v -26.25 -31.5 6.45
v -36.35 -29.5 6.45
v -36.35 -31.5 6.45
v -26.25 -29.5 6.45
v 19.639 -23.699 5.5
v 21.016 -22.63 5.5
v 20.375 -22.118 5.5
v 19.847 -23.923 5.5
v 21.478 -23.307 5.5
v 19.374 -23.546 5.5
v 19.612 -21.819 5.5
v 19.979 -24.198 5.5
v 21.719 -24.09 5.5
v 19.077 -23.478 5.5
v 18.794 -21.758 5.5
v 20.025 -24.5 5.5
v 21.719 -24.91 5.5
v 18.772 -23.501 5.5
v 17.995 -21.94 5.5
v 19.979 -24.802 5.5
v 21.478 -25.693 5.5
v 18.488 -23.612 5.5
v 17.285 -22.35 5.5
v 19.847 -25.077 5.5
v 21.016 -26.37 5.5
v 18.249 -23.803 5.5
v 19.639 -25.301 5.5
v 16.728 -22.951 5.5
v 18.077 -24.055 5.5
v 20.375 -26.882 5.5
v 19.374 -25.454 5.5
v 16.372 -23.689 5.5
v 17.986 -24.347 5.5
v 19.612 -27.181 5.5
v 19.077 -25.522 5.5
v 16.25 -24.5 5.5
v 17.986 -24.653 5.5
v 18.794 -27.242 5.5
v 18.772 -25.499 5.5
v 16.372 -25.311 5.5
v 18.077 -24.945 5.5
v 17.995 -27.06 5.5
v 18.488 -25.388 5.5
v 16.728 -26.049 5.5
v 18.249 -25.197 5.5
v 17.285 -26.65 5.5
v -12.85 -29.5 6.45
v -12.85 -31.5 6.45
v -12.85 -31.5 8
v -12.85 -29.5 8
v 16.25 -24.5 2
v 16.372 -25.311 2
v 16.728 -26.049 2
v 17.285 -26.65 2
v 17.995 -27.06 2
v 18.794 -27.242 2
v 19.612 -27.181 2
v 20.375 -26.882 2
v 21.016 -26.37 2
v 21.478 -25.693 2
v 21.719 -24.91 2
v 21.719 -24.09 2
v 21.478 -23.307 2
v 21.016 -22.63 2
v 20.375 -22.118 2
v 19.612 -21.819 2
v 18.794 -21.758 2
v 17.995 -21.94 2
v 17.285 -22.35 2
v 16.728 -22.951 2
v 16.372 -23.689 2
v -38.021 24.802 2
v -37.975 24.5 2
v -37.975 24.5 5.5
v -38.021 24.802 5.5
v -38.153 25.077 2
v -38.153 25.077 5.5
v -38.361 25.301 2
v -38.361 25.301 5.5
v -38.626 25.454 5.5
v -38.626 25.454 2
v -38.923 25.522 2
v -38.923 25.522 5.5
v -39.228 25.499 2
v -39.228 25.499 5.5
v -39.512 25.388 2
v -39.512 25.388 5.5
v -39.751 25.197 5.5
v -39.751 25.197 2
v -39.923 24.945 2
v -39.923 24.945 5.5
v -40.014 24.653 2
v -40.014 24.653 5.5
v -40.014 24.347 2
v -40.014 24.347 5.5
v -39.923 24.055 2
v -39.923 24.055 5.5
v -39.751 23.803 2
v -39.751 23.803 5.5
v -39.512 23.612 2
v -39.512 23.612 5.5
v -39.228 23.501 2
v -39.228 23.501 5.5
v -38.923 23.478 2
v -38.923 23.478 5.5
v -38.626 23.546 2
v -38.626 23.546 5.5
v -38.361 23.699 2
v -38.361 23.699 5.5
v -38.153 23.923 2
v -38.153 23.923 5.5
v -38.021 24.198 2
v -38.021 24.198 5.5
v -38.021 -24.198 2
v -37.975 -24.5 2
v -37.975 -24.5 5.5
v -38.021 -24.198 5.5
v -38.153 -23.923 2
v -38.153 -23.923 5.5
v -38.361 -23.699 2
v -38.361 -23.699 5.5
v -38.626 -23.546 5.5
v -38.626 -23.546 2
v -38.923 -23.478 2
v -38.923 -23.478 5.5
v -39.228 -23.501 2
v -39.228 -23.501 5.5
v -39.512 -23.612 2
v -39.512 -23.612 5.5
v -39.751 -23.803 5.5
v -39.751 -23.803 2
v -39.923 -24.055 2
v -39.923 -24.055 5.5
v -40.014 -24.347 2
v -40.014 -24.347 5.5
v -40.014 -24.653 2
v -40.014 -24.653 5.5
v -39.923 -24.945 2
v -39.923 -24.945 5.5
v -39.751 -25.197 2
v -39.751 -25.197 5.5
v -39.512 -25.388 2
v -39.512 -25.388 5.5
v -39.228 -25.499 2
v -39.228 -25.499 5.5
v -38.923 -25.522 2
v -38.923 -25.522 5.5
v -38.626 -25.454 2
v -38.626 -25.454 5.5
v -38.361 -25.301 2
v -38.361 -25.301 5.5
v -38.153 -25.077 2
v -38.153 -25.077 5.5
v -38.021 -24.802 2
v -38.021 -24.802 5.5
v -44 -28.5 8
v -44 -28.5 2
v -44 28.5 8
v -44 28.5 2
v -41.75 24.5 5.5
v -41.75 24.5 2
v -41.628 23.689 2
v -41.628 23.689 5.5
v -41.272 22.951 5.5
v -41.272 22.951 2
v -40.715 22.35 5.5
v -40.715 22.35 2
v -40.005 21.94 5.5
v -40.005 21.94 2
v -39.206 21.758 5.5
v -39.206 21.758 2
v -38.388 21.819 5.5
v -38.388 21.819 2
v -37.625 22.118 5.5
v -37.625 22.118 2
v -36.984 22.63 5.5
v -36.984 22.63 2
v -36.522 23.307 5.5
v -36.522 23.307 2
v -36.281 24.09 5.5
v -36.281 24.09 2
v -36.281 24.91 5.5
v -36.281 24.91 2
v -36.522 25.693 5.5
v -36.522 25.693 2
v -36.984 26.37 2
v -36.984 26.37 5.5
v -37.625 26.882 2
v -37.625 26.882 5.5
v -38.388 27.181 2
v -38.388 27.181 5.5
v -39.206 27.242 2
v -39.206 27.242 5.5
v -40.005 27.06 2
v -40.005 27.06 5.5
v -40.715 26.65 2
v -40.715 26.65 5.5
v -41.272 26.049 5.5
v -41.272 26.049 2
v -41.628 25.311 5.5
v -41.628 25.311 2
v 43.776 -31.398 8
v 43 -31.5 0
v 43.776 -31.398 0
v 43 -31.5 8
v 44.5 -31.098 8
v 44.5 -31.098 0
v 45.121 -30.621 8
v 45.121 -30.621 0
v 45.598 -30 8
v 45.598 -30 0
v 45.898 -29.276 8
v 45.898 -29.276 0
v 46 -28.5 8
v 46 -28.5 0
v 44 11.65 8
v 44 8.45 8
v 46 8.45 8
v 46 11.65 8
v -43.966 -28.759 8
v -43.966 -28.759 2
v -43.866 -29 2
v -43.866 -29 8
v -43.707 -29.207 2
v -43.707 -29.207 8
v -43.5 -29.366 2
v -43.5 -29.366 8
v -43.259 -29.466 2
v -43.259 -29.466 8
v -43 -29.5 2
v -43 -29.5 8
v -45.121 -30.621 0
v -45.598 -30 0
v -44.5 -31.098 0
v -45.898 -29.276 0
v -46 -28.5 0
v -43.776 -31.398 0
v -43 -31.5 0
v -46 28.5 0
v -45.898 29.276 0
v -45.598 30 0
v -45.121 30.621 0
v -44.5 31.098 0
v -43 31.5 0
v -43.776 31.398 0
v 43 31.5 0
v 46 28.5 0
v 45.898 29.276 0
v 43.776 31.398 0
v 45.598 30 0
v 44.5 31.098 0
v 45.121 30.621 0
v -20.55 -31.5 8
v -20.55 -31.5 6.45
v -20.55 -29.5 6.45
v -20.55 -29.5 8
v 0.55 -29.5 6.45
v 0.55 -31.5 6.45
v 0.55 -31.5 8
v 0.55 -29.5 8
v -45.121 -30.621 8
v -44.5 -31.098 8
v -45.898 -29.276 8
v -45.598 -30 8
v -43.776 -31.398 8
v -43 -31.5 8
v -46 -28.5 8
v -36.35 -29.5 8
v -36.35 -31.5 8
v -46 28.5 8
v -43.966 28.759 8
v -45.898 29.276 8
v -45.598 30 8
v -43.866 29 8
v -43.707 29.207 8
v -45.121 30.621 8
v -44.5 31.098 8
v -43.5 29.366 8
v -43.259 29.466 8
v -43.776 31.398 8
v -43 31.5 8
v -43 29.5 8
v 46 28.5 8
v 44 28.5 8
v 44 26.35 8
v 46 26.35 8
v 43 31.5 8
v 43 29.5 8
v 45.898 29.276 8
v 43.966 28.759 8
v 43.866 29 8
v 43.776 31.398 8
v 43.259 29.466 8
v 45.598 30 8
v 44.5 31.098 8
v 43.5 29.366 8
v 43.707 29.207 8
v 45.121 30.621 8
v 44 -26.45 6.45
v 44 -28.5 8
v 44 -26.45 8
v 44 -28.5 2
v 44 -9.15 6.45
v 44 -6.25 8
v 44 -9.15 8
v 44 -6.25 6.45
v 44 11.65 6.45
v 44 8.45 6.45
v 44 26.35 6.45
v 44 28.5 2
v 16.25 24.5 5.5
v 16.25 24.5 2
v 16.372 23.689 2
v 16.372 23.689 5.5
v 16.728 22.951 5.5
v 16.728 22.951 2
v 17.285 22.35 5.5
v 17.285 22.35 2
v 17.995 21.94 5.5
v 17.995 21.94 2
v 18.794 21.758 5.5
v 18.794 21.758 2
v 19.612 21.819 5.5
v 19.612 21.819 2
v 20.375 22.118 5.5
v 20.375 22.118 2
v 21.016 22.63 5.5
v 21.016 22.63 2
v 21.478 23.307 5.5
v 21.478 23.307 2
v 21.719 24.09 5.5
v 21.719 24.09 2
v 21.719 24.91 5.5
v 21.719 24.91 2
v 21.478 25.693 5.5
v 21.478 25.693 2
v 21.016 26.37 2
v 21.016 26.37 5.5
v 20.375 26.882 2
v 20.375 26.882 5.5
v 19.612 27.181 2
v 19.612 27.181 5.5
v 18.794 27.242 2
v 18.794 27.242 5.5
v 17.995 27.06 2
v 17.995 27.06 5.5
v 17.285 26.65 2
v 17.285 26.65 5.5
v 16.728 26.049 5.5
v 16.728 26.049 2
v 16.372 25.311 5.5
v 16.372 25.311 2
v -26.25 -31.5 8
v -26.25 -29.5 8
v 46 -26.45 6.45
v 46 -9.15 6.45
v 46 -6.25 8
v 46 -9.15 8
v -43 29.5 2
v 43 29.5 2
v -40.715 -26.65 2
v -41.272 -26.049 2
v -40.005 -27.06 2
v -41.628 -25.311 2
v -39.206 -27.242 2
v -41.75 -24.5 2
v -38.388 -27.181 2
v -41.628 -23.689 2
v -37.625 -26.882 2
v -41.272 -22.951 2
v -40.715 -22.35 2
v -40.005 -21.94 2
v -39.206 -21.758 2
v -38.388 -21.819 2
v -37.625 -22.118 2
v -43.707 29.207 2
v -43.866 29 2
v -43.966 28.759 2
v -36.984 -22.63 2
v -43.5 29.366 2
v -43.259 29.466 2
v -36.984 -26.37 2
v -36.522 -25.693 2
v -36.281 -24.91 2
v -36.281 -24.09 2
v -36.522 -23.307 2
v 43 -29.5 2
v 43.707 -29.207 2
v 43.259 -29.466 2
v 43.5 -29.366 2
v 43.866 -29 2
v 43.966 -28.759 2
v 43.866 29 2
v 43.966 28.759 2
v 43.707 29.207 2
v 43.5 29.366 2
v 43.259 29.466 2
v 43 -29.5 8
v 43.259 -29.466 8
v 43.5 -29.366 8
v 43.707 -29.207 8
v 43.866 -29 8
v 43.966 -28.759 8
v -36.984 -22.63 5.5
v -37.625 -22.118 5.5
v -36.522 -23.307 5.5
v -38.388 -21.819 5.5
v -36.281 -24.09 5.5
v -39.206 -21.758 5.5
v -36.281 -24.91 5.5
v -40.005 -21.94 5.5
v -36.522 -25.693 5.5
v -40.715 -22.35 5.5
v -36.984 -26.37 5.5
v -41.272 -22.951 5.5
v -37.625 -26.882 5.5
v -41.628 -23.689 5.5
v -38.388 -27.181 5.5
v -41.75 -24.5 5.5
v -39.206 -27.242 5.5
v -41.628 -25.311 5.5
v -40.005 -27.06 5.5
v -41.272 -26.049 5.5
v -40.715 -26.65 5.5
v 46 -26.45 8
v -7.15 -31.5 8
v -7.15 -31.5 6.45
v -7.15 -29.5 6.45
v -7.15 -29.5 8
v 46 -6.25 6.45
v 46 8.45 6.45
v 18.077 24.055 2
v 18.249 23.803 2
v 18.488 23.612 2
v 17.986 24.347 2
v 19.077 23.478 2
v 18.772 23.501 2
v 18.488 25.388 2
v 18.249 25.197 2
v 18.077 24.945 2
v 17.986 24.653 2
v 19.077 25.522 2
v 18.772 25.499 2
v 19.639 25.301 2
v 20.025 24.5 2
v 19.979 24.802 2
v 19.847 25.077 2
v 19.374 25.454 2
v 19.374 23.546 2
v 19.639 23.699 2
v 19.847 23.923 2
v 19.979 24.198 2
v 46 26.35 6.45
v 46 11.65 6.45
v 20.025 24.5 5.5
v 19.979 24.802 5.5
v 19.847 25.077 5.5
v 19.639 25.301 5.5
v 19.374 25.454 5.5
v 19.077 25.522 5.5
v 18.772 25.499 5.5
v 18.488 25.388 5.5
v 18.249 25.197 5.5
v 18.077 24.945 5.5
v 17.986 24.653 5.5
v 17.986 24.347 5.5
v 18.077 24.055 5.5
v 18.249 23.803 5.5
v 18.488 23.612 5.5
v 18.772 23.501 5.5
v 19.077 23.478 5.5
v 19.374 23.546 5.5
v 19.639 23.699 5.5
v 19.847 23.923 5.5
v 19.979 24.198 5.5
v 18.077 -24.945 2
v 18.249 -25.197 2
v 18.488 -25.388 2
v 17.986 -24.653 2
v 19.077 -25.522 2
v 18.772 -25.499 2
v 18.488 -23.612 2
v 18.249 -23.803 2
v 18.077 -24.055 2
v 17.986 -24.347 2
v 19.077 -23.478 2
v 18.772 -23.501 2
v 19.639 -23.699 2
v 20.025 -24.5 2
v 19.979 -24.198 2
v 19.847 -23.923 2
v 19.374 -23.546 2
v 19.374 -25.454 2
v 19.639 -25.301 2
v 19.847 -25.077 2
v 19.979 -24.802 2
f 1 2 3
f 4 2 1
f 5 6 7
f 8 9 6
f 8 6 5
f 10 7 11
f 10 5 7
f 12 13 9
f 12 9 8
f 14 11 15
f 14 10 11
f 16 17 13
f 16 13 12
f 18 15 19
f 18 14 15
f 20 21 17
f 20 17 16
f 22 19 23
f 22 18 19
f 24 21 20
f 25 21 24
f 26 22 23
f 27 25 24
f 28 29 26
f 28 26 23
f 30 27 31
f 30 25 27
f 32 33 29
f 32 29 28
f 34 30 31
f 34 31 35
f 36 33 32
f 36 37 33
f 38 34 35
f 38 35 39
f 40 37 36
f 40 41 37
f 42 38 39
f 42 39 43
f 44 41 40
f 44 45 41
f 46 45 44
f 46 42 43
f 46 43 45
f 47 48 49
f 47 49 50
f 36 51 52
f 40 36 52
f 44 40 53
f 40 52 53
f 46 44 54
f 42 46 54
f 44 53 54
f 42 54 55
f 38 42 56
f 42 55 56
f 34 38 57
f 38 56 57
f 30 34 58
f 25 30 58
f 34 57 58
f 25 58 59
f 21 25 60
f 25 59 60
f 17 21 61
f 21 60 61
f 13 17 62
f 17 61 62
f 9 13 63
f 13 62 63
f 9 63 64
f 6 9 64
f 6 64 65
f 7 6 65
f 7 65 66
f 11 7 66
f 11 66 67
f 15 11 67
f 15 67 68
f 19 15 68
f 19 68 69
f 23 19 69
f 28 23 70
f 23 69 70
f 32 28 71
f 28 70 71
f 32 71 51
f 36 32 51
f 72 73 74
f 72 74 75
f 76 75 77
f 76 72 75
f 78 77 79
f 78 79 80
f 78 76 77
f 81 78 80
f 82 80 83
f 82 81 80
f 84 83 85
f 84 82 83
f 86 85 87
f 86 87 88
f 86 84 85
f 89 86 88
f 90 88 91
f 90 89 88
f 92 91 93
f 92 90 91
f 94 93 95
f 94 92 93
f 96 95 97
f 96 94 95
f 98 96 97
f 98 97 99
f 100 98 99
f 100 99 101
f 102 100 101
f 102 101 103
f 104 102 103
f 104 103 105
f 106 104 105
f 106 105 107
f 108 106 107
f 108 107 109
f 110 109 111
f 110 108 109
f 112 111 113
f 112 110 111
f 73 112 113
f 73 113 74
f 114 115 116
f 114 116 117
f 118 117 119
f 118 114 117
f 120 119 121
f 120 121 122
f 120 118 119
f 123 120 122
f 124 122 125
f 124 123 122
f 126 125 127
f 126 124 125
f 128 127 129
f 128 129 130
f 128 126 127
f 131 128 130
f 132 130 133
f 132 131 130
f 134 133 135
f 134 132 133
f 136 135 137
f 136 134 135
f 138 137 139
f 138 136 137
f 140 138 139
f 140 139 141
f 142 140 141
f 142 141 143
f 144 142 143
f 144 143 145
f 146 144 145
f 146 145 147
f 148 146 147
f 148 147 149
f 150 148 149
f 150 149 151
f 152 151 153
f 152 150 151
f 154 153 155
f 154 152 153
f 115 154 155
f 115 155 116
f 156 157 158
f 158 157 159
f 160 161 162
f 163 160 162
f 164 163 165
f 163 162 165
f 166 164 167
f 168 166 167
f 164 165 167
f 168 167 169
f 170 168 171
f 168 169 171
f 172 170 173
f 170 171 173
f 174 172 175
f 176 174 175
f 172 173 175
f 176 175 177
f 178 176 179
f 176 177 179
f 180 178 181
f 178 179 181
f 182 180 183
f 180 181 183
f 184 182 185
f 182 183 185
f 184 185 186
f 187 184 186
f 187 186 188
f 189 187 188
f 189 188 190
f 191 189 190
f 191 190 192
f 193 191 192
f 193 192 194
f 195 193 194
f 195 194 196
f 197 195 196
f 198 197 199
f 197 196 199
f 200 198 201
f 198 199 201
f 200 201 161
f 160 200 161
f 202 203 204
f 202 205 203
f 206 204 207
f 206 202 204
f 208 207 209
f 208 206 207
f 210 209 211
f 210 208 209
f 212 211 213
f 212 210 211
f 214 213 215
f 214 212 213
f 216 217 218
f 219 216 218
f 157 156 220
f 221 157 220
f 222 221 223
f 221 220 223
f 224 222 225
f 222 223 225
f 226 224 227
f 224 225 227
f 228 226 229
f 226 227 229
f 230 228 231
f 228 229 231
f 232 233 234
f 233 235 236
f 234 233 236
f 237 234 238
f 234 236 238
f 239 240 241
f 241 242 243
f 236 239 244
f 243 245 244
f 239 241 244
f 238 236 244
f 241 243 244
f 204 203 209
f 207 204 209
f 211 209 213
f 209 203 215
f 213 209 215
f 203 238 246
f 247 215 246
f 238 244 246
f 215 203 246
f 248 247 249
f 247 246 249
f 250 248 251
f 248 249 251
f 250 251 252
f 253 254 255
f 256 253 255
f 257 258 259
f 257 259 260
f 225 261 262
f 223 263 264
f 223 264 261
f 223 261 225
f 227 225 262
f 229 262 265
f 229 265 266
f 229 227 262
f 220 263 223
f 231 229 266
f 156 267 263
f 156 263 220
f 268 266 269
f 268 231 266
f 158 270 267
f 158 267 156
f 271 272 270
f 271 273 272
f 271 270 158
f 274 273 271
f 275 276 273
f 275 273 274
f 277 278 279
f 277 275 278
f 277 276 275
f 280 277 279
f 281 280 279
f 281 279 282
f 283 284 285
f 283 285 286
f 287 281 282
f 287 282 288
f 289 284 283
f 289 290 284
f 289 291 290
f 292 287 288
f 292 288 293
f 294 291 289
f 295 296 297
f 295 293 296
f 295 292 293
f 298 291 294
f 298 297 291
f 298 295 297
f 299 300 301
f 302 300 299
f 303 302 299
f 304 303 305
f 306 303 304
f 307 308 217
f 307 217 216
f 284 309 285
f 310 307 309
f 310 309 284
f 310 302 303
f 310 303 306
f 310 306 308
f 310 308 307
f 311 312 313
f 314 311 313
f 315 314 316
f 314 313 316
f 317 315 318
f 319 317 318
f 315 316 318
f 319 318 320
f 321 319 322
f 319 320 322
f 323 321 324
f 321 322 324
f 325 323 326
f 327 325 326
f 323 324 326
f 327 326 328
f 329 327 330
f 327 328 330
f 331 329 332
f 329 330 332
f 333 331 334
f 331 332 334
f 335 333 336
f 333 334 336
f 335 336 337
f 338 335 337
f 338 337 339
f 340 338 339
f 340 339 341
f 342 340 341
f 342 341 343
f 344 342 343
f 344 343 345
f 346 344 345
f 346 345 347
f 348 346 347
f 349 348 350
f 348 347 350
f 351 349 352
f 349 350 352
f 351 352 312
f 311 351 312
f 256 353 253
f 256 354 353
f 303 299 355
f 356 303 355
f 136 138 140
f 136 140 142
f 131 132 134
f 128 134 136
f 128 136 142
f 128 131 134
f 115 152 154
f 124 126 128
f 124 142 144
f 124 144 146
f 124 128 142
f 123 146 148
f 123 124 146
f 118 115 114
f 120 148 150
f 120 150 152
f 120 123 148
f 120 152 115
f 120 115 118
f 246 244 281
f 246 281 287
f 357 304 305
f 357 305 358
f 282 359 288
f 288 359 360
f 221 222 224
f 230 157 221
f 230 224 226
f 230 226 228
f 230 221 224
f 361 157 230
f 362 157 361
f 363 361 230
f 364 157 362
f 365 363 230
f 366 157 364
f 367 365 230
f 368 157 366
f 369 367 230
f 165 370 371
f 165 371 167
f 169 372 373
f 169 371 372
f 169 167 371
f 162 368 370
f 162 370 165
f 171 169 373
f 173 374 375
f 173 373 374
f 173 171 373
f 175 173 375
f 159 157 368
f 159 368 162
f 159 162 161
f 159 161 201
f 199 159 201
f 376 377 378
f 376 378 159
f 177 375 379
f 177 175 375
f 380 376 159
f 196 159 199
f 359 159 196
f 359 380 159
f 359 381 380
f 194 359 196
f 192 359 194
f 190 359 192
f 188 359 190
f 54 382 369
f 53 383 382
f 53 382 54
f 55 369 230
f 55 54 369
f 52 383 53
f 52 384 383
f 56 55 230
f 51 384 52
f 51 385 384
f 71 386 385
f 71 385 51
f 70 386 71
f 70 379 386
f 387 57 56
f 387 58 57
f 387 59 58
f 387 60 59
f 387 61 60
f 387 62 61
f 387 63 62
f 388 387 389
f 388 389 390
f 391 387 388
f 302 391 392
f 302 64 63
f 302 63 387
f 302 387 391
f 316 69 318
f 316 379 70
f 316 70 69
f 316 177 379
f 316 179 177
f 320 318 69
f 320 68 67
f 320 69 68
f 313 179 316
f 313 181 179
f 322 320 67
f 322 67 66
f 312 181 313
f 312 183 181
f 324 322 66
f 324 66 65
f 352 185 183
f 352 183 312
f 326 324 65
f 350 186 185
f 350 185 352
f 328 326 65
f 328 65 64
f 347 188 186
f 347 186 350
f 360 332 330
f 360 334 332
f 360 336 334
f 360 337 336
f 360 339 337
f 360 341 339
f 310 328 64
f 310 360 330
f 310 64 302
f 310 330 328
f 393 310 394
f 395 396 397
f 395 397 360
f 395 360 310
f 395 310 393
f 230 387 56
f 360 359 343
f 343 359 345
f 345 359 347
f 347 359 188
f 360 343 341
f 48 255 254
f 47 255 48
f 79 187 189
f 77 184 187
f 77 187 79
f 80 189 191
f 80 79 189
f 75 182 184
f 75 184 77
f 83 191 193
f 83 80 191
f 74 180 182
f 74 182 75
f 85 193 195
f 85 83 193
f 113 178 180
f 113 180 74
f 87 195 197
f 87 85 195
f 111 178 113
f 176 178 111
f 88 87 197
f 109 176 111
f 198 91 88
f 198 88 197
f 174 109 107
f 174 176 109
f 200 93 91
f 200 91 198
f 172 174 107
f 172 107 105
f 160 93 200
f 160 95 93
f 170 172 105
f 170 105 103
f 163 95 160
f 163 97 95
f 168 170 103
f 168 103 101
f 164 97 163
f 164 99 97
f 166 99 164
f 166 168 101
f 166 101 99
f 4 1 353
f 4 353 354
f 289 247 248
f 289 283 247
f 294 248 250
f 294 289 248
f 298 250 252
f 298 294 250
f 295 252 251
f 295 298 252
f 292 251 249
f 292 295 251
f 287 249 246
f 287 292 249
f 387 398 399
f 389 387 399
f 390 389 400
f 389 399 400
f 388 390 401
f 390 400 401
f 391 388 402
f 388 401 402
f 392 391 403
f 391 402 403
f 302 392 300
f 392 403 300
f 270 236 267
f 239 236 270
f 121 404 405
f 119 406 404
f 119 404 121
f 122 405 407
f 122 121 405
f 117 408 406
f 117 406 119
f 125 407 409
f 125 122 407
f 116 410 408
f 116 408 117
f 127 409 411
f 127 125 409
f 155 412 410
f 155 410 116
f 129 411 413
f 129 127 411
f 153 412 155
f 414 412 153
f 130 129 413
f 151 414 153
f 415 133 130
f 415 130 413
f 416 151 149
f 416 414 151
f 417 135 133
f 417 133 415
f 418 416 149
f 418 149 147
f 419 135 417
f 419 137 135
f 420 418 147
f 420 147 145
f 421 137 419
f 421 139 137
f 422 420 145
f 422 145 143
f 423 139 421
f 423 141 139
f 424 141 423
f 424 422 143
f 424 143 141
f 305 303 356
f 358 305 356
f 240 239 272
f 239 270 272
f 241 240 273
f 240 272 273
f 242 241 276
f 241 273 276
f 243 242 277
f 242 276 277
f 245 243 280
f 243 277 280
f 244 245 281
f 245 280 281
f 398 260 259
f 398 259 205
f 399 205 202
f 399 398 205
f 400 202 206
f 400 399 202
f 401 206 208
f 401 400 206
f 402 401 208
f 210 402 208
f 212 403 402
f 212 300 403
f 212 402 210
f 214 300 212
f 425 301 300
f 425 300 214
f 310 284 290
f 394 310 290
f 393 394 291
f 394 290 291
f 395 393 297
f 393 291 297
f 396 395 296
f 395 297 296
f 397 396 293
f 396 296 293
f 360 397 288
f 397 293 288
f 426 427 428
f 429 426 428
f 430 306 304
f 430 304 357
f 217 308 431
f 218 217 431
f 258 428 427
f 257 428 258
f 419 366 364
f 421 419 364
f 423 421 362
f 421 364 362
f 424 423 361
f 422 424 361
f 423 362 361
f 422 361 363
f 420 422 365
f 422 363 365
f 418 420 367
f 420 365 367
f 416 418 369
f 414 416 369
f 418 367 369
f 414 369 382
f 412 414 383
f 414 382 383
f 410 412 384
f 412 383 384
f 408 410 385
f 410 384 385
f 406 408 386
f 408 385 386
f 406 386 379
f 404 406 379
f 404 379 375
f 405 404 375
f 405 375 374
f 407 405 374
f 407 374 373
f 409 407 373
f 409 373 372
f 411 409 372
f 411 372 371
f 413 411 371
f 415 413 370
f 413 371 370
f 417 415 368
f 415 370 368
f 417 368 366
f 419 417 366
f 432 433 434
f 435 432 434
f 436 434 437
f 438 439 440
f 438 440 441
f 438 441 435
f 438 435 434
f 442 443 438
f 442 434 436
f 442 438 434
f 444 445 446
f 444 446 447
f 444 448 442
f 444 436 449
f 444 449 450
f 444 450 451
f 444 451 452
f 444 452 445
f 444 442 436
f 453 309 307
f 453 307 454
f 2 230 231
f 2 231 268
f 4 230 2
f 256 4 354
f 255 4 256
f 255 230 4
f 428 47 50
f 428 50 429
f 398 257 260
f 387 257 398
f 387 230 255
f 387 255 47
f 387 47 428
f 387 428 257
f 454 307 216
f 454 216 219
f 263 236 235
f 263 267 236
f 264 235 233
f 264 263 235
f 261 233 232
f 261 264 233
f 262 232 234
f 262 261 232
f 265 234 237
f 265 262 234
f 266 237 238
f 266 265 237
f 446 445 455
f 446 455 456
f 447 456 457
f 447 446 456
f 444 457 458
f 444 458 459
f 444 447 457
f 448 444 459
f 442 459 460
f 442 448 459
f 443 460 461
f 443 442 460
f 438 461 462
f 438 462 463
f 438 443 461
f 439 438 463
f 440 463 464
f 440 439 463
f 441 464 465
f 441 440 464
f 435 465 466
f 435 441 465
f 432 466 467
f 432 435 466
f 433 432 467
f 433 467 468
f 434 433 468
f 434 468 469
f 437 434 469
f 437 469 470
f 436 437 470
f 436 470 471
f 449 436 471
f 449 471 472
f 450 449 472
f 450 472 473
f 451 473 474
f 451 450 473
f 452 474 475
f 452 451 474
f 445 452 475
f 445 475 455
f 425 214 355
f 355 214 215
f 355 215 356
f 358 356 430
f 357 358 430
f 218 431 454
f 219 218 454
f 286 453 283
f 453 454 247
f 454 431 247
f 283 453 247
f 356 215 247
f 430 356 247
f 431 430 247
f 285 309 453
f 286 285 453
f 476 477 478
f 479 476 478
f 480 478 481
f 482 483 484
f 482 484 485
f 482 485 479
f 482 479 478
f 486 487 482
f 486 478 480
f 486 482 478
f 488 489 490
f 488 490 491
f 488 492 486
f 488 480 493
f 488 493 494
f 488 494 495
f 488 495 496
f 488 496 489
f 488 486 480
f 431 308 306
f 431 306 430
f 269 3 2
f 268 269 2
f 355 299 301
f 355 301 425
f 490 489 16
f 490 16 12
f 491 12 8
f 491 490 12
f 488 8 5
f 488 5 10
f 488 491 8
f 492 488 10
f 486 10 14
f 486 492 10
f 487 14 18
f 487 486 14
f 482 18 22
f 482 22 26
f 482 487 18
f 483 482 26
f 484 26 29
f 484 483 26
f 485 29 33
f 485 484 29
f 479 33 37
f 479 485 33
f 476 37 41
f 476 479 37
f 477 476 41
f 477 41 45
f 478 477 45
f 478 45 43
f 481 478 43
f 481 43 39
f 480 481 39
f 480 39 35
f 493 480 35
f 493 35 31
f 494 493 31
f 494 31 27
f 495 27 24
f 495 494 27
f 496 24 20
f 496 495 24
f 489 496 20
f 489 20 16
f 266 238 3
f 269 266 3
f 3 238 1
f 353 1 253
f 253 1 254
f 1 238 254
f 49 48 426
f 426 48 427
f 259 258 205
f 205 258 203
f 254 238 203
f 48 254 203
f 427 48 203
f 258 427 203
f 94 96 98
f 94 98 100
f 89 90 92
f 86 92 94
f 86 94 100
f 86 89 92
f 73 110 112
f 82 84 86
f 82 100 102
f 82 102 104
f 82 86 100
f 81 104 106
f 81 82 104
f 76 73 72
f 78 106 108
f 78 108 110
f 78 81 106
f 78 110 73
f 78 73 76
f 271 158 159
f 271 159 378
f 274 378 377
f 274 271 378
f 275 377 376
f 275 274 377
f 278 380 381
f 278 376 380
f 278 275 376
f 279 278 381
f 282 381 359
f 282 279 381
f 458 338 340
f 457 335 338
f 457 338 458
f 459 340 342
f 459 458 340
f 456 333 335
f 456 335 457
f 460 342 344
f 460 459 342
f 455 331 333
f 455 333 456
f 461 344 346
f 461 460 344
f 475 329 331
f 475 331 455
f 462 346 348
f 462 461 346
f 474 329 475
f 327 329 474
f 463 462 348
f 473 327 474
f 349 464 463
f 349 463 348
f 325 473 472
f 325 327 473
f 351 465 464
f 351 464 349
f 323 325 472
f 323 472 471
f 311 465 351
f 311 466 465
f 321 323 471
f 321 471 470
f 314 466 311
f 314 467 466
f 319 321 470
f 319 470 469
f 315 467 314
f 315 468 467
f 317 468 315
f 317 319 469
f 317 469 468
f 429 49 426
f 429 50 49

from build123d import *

# Parameters (mm, degrees)
CASEENVELOPE_W                       = 92
CASEENVELOPE_H                       = 63
BOTTOM_ENVELOPE_DEPTH                = 8
OUTSIDE_R3_R                         = 3
SHELL_1_T                            = -2
SIDEPORT_CLEARANCE_1_START           = 6.45
SIDEPORT_PROFILE_1_W                 = 10.1
SIDEPORT_PROFILE_1_H                 = 13
SIDEPORT_CLEARANCE_1_DEPTH           = 4.5
SIDEPORT_CLEARANCE_2_START           = 6.45
SIDEPORT_PROFILE_2_W                 = 7.7
SIDEPORT_PROFILE_2_H                 = 13
SIDEPORT_CLEARANCE_2_DEPTH           = 4.7
SIDEPORT_CLEARANCE_3_START           = 6.45
SIDEPORT_PROFILE_3_W                 = 7.7
SIDEPORT_PROFILE_3_H                 = 13
SIDEPORT_CLEARANCE_3_DEPTH           = 4.7
ENDPORT_CLEARANCE_1_START            = 6.45
ENDPORT_PROFILE_1_W                  = 11
ENDPORT_PROFILE_1_H                  = 17.3
ENDPORT_CLEARANCE_1_DEPTH            = 14.6
ENDPORT_CLEARANCE_2_START            = 6.45
ENDPORT_PROFILE_2_W                  = 11
ENDPORT_PROFILE_2_H                  = 14.7
ENDPORT_CLEARANCE_2_DEPTH            = 16.3
ENDPORT_CLEARANCE_3_START            = 6.45
ENDPORT_PROFILE_3_W                  = 11
ENDPORT_PROFILE_3_H                  = 14.7
ENDPORT_CLEARANCE_3_DEPTH            = 16.3
FOUR_M2P5_STANDOFFS_2P05_PILOT_START = 2
STANDOFF_RINGS_R                     = 2.75
STANDOFF_RINGS_R_2                   = 1.025
FOUR_M2P5_STANDOFFS_2P05_PILOT_DEPTH = 3.5


with BuildPart() as part:
    # CaseEnvelope → Bottom_Envelope (new body)
    with BuildSketch(Plane.XY):
        Rectangle(CASEENVELOPE_W, CASEENVELOPE_H)
    extrude(amount=BOTTOM_ENVELOPE_DEPTH)

    # Outside_R3
    outside_r3_edges = [part.edges().sort_by_distance(p)[0] for p in [
        (46, -31.5, 4),
        (-46, -31.5, 4),
        (-46, 31.5, 4),
        (46, 31.5, 4),
    ]]
    fillet(outside_r3_edges, radius=OUTSIDE_R3_R)

    # 抽壳1
    shell_1_openings = [part.faces().sort_by_distance(p)[0] for p in [
        (0, 0, 8),
    ]]
    offset(amount=SHELL_1_T, openings=shell_1_openings, kind=Kind.INTERSECTION)

    # SidePort_Profile_1 → SidePort_Clearance_1 (cut)
    with BuildSketch(Plane.XY.offset(SIDEPORT_CLEARANCE_1_START)):
        with Locations((-31.3, -33.5)):
            Rectangle(SIDEPORT_PROFILE_1_W, SIDEPORT_PROFILE_1_H)
    extrude(amount=SIDEPORT_CLEARANCE_1_DEPTH, mode=Mode.SUBTRACT)

    # SidePort_Profile_2 → SidePort_Clearance_2 (cut)
    with BuildSketch(Plane.XY.offset(SIDEPORT_CLEARANCE_2_START)):
        with Locations((-16.7, -33.5)):
            Rectangle(SIDEPORT_PROFILE_2_W, SIDEPORT_PROFILE_2_H)
    extrude(amount=SIDEPORT_CLEARANCE_2_DEPTH, mode=Mode.SUBTRACT)

    # SidePort_Profile_3 → SidePort_Clearance_3 (cut)
    with BuildSketch(Plane.XY.offset(SIDEPORT_CLEARANCE_3_START)):
        with Locations((-3.3, -33.5)):
            Rectangle(SIDEPORT_PROFILE_3_W, SIDEPORT_PROFILE_3_H)
    extrude(amount=SIDEPORT_CLEARANCE_3_DEPTH, mode=Mode.SUBTRACT)

    # EndPort_Profile_1 → EndPort_Clearance_1 (cut)
    with BuildSketch(Plane.XY.offset(ENDPORT_CLEARANCE_1_START)):
        with Locations((47.5, -17.8)):
            Rectangle(ENDPORT_PROFILE_1_W, ENDPORT_PROFILE_1_H)
    extrude(amount=ENDPORT_CLEARANCE_1_DEPTH, mode=Mode.SUBTRACT)

    # EndPort_Profile_2 → EndPort_Clearance_2 (cut)
    with BuildSketch(Plane.XY.offset(ENDPORT_CLEARANCE_2_START)):
        with Locations((47.5, 1.1)):
            Rectangle(ENDPORT_PROFILE_2_W, ENDPORT_PROFILE_2_H)
    extrude(amount=ENDPORT_CLEARANCE_2_DEPTH, mode=Mode.SUBTRACT)

    # EndPort_Profile_3 → EndPort_Clearance_3 (cut)
    with BuildSketch(Plane.XY.offset(ENDPORT_CLEARANCE_3_START)):
        with Locations((47.5, 19)):
            Rectangle(ENDPORT_PROFILE_3_W, ENDPORT_PROFILE_3_H)
    extrude(amount=ENDPORT_CLEARANCE_3_DEPTH, mode=Mode.SUBTRACT)

    # Standoff_Rings → Four_M2p5_Standoffs_2p05_Pilot (add)
    # profile 1 of 4: a face of its own
    with BuildSketch(Plane.XY.offset(FOUR_M2P5_STANDOFFS_2P05_PILOT_START)):
        with Locations(Location((-39, -24.5, 0), (0, 0, 180))):
            Circle(STANDOFF_RINGS_R)
        with Locations((-39, -24.5)):
            Circle(STANDOFF_RINGS_R_2, mode=Mode.SUBTRACT)
    # profile 2 of 4: a face of its own
    with BuildSketch(Plane.XY.offset(FOUR_M2P5_STANDOFFS_2P05_PILOT_START)):
        with Locations(Location((-39, 24.5, 0), (0, 0, 180))):
            Circle(STANDOFF_RINGS_R)
        with Locations((-39, 24.5)):
            Circle(STANDOFF_RINGS_R_2, mode=Mode.SUBTRACT)
    # profile 3 of 4: a face of its own
    with BuildSketch(Plane.XY.offset(FOUR_M2P5_STANDOFFS_2P05_PILOT_START)):
        with Locations(Location((19, -24.5, 0), (0, 0, 180))):
            Circle(STANDOFF_RINGS_R)
        with Locations((19, -24.5)):
            Circle(STANDOFF_RINGS_R_2, mode=Mode.SUBTRACT)
    # profile 4 of 4: a face of its own
    with BuildSketch(Plane.XY.offset(FOUR_M2P5_STANDOFFS_2P05_PILOT_START)):
        with Locations(Location((19, 24.5, 0), (0, 0, 180))):
            Circle(STANDOFF_RINGS_R)
        with Locations((19, 24.5)):
            Circle(STANDOFF_RINGS_R_2, mode=Mode.SUBTRACT)
    extrude(amount=FOUR_M2P5_STANDOFFS_2P05_PILOT_DEPTH)


solid = part.part
